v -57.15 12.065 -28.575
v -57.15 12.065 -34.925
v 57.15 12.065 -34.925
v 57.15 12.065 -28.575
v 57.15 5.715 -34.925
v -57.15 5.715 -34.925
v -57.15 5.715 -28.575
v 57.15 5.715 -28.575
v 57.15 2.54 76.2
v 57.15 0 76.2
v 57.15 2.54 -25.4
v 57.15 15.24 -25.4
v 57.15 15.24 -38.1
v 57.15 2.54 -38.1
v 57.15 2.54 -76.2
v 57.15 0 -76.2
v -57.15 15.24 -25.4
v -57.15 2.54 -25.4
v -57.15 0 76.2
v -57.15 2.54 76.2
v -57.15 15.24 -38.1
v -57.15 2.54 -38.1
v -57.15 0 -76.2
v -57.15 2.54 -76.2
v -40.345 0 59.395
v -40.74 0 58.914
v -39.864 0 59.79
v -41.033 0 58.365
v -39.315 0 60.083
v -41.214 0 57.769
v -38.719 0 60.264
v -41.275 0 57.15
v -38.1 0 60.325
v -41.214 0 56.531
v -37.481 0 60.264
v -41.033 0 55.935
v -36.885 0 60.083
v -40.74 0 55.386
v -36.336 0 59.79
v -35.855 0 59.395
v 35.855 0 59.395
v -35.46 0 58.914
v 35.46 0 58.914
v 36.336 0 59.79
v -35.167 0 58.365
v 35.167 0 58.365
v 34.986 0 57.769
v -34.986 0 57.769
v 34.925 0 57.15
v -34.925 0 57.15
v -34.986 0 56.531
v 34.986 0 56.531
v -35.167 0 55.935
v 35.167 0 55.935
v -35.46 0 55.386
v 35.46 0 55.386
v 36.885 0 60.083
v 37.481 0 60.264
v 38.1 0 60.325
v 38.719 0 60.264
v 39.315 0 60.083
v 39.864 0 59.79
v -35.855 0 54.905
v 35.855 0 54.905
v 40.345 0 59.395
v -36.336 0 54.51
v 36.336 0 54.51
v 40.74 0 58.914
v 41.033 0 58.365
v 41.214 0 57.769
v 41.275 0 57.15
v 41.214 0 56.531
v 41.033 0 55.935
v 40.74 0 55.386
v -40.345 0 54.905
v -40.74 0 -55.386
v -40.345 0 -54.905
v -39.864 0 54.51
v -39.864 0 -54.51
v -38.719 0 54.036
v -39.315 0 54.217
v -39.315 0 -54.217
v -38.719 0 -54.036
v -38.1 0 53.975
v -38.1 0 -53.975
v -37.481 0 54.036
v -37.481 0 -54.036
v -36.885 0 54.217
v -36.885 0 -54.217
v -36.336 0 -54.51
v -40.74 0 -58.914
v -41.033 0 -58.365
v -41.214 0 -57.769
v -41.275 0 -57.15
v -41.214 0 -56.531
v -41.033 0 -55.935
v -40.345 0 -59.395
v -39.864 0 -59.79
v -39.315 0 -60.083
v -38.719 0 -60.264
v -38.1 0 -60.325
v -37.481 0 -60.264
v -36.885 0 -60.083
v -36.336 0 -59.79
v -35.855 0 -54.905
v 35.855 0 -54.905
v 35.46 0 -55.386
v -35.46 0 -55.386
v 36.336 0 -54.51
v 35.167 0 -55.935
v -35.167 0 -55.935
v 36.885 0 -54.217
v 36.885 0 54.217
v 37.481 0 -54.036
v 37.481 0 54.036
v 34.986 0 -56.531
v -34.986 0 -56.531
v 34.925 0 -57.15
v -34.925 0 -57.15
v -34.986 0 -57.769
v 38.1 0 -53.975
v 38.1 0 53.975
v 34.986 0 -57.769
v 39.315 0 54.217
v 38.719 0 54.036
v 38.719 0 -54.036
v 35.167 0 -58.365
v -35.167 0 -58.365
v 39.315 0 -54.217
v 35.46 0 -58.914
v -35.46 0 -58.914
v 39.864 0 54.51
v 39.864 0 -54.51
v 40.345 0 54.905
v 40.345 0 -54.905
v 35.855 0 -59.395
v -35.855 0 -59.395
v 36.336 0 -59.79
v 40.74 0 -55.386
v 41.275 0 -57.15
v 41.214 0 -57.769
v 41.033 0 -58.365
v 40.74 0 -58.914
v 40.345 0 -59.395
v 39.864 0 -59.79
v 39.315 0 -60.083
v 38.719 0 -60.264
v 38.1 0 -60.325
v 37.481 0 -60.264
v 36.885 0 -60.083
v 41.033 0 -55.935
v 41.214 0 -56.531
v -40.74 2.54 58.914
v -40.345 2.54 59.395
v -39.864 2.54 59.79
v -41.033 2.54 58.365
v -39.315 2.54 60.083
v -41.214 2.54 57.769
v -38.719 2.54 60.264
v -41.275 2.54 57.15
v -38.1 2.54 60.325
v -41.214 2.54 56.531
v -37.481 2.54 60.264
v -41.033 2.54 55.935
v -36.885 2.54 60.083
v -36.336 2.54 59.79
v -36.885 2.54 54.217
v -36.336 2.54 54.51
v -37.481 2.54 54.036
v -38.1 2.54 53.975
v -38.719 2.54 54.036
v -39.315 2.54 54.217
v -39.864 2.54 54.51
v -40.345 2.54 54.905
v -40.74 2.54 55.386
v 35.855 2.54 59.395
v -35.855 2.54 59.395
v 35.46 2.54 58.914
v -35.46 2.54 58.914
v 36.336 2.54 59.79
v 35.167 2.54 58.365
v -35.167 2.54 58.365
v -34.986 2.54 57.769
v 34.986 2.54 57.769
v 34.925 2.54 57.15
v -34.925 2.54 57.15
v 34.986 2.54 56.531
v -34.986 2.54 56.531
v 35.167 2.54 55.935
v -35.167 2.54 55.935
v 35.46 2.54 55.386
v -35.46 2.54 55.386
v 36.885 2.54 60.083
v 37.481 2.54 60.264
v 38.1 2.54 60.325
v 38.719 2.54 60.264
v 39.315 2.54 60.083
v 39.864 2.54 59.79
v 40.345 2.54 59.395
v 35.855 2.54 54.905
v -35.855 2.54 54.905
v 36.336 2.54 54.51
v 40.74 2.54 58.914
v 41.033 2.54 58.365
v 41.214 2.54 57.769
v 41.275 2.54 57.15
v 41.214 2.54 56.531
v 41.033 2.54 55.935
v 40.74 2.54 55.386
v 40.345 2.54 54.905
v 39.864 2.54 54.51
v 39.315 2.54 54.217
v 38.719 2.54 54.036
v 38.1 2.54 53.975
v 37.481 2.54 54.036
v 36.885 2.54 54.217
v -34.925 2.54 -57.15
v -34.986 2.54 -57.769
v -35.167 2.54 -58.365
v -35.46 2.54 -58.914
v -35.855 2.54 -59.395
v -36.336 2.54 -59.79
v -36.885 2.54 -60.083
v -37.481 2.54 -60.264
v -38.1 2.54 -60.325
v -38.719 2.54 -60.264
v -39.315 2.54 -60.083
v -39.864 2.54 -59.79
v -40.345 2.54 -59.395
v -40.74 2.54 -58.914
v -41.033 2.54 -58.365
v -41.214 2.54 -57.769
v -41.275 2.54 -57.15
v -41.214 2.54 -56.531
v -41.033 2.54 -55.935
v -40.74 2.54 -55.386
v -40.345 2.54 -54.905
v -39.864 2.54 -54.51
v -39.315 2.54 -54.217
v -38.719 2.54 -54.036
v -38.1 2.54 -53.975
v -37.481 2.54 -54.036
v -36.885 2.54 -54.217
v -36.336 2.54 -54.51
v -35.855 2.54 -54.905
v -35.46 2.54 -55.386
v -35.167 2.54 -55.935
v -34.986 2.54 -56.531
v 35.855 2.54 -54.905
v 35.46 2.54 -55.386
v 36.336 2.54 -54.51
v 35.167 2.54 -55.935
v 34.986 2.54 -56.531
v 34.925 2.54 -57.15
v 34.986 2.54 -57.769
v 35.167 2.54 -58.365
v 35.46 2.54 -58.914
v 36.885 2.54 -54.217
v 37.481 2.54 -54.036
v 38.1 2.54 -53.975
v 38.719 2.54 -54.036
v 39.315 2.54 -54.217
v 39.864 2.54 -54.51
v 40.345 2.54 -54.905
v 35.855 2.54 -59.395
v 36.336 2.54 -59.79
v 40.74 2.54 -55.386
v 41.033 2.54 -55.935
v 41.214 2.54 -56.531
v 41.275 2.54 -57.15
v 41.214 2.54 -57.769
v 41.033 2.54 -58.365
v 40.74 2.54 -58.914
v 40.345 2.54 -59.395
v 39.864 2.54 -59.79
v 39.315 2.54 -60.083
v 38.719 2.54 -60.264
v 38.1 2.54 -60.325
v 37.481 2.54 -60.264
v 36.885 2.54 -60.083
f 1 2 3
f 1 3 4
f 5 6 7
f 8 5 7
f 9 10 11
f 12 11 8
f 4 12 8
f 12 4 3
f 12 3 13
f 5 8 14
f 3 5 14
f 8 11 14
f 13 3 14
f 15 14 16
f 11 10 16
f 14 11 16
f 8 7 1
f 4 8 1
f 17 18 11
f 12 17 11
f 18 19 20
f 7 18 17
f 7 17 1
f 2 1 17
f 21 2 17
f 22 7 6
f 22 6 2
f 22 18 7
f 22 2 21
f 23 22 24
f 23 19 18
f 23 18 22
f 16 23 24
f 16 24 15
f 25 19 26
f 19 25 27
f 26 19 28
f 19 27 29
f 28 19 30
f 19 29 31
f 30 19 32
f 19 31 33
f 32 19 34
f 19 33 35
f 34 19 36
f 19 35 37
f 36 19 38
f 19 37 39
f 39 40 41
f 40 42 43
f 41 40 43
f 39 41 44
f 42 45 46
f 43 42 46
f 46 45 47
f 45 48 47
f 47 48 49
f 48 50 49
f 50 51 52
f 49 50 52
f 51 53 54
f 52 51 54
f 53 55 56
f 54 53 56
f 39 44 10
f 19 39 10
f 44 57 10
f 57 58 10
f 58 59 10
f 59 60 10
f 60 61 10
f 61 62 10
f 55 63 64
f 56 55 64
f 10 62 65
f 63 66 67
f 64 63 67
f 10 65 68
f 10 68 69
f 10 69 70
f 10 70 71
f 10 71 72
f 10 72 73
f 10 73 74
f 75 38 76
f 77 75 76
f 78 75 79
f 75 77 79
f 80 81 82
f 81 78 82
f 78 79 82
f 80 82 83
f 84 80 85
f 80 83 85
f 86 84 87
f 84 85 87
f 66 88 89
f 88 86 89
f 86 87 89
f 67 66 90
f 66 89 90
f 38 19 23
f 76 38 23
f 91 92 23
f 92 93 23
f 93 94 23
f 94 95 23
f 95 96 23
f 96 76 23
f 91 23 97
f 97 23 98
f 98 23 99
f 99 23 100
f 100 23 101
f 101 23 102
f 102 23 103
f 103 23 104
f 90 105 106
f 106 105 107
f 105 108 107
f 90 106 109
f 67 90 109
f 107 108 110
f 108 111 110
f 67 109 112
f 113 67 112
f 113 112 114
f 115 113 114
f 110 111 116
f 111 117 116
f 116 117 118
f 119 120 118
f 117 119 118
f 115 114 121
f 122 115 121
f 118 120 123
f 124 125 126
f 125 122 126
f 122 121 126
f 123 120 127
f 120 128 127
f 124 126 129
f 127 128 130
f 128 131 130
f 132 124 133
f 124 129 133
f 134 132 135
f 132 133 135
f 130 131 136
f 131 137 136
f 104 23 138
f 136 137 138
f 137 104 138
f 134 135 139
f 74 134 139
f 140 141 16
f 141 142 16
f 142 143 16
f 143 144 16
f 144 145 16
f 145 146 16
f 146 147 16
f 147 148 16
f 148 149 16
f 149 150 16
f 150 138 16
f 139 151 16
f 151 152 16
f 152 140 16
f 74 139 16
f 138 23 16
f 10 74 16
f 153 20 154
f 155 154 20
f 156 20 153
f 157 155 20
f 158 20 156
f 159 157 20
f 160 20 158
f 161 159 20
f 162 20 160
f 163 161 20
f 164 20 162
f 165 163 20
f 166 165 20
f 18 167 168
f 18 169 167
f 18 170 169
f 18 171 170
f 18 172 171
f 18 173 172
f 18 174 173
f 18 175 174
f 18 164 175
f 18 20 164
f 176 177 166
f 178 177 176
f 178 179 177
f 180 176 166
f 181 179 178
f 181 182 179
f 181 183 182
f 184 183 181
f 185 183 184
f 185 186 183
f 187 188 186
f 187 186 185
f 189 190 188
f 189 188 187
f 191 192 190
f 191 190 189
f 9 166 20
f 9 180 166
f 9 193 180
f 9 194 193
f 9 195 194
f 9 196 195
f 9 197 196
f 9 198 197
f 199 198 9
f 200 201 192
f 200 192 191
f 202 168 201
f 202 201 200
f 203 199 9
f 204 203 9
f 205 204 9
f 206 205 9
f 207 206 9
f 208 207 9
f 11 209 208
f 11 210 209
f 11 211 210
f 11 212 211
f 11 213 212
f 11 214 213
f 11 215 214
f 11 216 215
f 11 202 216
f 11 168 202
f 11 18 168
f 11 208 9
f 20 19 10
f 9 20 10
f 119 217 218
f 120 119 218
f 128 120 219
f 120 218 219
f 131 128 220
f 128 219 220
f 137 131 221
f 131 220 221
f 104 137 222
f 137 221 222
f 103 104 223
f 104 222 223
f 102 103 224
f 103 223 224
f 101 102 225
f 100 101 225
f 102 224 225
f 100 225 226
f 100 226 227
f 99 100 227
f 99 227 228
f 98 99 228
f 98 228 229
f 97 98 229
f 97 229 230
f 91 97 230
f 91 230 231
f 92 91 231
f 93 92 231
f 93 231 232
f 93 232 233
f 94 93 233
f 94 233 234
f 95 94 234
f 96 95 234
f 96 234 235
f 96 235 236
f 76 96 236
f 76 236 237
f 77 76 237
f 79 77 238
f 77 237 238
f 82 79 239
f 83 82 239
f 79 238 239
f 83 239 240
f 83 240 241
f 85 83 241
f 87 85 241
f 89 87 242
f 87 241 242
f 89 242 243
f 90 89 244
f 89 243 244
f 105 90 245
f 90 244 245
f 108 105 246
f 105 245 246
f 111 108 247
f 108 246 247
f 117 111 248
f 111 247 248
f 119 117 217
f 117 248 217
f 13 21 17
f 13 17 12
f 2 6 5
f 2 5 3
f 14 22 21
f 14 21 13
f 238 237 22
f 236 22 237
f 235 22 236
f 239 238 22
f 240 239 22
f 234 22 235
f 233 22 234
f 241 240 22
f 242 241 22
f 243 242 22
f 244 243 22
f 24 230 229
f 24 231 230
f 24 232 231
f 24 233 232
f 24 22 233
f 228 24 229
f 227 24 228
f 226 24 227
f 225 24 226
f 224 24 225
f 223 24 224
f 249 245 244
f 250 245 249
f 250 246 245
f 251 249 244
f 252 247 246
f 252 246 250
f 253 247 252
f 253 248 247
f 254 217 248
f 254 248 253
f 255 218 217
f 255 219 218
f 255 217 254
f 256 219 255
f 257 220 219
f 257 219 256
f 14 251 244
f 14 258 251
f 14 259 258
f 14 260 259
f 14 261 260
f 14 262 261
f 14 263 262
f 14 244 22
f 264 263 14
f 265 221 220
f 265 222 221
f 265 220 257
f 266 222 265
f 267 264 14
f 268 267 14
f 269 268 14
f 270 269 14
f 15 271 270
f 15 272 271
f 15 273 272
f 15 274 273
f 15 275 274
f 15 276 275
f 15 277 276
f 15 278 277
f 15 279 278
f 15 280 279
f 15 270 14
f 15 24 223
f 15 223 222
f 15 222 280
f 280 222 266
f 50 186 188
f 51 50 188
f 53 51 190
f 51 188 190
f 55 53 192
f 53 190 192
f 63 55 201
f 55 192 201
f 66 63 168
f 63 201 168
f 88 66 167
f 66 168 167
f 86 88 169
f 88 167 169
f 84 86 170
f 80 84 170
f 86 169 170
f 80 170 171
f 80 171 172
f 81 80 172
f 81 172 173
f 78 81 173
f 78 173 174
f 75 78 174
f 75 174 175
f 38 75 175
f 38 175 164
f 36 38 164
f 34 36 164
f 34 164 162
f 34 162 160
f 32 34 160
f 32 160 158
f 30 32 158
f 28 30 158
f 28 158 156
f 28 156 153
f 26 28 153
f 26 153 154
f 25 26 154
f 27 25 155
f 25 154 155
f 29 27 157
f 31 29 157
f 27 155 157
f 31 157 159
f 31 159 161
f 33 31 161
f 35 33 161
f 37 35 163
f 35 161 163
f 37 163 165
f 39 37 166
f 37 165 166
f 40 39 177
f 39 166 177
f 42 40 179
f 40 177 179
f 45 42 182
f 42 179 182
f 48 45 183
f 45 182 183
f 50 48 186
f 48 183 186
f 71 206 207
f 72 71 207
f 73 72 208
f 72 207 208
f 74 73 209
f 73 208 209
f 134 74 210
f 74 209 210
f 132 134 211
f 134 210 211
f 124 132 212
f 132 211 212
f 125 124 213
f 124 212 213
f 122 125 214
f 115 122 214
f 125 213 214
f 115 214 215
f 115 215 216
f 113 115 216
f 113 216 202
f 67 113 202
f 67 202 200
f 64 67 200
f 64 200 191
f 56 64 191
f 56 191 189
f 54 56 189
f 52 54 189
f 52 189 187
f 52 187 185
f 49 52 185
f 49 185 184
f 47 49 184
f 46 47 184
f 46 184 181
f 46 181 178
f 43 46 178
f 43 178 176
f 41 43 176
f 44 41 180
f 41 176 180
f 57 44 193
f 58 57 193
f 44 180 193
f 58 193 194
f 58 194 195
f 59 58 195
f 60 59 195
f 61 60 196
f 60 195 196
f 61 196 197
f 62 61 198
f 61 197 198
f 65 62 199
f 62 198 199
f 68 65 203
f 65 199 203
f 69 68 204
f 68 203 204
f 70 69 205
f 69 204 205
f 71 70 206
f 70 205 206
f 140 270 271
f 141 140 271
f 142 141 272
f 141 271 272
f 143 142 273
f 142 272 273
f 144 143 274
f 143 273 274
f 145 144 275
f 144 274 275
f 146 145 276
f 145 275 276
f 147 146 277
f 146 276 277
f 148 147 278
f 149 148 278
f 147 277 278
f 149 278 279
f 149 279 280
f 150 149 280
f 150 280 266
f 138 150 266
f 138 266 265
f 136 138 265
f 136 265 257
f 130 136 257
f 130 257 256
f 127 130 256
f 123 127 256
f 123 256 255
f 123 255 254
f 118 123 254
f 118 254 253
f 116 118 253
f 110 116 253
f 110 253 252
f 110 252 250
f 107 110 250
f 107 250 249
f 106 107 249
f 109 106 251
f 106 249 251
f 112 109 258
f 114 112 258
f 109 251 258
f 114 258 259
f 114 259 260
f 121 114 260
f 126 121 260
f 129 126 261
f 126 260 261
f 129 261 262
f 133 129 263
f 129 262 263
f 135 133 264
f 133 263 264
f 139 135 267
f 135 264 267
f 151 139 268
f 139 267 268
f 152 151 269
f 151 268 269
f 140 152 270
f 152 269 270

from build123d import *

# Parameters (mm, degrees)
SKETCH1_W           = 114.3
SKETCH1_H           = 152.4
BOSS_EXTRUDE1_DEPTH = 2.54
SKETCH2_W           = 114.3
SKETCH2_H           = 12.7
BOSS_EXTRUDE2_DEPTH = 12.7
SKETCH3_W           = 6.35
SKETCH3_H           = 6.35
CUT_EXTRUDE1_DEPTH  = 115.3
SKETCH4_R           = 3.175
CUT_EXTRUDE2_DEPTH  = 3.54


with BuildPart() as part:
    # Sketch1 → Boss-Extrude1 (new body)
    with BuildSketch(Plane(origin=(0, 0, 0), x_dir=(1, 0, 0), z_dir=(0, 1, 0))):
        Rectangle(SKETCH1_W, SKETCH1_H)
    extrude(amount=BOSS_EXTRUDE1_DEPTH)

    # Sketch2 → Boss-Extrude2 (add)
    with BuildSketch(Plane(origin=(0, 2.54, 0), x_dir=(1, 0, 0), z_dir=(0, 1, 0))):
        with Locations((0, 31.75)):
            Rectangle(SKETCH2_W, SKETCH2_H)
    extrude(amount=BOSS_EXTRUDE2_DEPTH)

    # Sketch3 → Cut-Extrude1 (cut, through all)
    with BuildSketch(Plane.ZY.offset(57.15)):
        with Locations((-31.75, 8.89)):
            Rectangle(SKETCH3_W, SKETCH3_H)
    extrude(amount=-CUT_EXTRUDE1_DEPTH, mode=Mode.SUBTRACT)

    # Sketch4 → Cut-Extrude2 (cut, through all)
    with BuildSketch(Plane(origin=(0, 2.54, 0), x_dir=(1, 0, 0), z_dir=(0, 1, 0))):
        with Locations((-38.1, 57.15)):
            Circle(SKETCH4_R)
        with Locations((38.1, 57.15)):
            Circle(SKETCH4_R)
        with Locations((-38.1, -57.15)):
            Circle(SKETCH4_R)
        with Locations((38.1, -57.15)):
            Circle(SKETCH4_R)
    extrude(amount=-CUT_EXTRUDE2_DEPTH, mode=Mode.SUBTRACT)


solid = part.part
